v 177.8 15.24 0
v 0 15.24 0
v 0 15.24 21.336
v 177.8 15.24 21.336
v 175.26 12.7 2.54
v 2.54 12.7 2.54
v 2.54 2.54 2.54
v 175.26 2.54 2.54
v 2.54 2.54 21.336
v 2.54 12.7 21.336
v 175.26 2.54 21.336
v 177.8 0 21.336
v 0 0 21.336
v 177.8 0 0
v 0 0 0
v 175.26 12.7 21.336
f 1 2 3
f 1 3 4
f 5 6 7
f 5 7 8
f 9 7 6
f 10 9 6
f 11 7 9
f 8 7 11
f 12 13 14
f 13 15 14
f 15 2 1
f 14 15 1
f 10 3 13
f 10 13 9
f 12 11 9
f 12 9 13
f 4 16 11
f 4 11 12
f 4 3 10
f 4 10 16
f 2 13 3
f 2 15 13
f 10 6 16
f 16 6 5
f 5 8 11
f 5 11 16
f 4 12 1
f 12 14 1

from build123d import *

# Parameters (mm, degrees)
SKETCH1_W           = 177.8
SKETCH1_H           = 15.24
BOSS_EXTRUDE1_DEPTH = 2.54
SKETCH2_W           = 177.8
SKETCH2_H           = 15.24
SKETCH2_W_2         = 172.72
SKETCH2_H_2         = 10.16
BOSS_EXTRUDE2_DEPTH = 18.796


with BuildPart() as part:
    # Sketch1 → Boss-Extrude1 (new body)
    with BuildSketch(Plane.XY):
        with Locations((88.9, 7.62)):
            Rectangle(SKETCH1_W, SKETCH1_H)
    extrude(amount=BOSS_EXTRUDE1_DEPTH)

    # Sketch2 → Boss-Extrude2 (add)
    with BuildSketch(Plane.XY.offset(2.54)):
        with Locations((88.9, 7.62)):
            Rectangle(SKETCH2_W, SKETCH2_H)
        with Locations((88.9, 7.62)):
            Rectangle(SKETCH2_W_2, SKETCH2_H_2, mode=Mode.SUBTRACT)
    extrude(amount=BOSS_EXTRUDE2_DEPTH)


solid = part.part
